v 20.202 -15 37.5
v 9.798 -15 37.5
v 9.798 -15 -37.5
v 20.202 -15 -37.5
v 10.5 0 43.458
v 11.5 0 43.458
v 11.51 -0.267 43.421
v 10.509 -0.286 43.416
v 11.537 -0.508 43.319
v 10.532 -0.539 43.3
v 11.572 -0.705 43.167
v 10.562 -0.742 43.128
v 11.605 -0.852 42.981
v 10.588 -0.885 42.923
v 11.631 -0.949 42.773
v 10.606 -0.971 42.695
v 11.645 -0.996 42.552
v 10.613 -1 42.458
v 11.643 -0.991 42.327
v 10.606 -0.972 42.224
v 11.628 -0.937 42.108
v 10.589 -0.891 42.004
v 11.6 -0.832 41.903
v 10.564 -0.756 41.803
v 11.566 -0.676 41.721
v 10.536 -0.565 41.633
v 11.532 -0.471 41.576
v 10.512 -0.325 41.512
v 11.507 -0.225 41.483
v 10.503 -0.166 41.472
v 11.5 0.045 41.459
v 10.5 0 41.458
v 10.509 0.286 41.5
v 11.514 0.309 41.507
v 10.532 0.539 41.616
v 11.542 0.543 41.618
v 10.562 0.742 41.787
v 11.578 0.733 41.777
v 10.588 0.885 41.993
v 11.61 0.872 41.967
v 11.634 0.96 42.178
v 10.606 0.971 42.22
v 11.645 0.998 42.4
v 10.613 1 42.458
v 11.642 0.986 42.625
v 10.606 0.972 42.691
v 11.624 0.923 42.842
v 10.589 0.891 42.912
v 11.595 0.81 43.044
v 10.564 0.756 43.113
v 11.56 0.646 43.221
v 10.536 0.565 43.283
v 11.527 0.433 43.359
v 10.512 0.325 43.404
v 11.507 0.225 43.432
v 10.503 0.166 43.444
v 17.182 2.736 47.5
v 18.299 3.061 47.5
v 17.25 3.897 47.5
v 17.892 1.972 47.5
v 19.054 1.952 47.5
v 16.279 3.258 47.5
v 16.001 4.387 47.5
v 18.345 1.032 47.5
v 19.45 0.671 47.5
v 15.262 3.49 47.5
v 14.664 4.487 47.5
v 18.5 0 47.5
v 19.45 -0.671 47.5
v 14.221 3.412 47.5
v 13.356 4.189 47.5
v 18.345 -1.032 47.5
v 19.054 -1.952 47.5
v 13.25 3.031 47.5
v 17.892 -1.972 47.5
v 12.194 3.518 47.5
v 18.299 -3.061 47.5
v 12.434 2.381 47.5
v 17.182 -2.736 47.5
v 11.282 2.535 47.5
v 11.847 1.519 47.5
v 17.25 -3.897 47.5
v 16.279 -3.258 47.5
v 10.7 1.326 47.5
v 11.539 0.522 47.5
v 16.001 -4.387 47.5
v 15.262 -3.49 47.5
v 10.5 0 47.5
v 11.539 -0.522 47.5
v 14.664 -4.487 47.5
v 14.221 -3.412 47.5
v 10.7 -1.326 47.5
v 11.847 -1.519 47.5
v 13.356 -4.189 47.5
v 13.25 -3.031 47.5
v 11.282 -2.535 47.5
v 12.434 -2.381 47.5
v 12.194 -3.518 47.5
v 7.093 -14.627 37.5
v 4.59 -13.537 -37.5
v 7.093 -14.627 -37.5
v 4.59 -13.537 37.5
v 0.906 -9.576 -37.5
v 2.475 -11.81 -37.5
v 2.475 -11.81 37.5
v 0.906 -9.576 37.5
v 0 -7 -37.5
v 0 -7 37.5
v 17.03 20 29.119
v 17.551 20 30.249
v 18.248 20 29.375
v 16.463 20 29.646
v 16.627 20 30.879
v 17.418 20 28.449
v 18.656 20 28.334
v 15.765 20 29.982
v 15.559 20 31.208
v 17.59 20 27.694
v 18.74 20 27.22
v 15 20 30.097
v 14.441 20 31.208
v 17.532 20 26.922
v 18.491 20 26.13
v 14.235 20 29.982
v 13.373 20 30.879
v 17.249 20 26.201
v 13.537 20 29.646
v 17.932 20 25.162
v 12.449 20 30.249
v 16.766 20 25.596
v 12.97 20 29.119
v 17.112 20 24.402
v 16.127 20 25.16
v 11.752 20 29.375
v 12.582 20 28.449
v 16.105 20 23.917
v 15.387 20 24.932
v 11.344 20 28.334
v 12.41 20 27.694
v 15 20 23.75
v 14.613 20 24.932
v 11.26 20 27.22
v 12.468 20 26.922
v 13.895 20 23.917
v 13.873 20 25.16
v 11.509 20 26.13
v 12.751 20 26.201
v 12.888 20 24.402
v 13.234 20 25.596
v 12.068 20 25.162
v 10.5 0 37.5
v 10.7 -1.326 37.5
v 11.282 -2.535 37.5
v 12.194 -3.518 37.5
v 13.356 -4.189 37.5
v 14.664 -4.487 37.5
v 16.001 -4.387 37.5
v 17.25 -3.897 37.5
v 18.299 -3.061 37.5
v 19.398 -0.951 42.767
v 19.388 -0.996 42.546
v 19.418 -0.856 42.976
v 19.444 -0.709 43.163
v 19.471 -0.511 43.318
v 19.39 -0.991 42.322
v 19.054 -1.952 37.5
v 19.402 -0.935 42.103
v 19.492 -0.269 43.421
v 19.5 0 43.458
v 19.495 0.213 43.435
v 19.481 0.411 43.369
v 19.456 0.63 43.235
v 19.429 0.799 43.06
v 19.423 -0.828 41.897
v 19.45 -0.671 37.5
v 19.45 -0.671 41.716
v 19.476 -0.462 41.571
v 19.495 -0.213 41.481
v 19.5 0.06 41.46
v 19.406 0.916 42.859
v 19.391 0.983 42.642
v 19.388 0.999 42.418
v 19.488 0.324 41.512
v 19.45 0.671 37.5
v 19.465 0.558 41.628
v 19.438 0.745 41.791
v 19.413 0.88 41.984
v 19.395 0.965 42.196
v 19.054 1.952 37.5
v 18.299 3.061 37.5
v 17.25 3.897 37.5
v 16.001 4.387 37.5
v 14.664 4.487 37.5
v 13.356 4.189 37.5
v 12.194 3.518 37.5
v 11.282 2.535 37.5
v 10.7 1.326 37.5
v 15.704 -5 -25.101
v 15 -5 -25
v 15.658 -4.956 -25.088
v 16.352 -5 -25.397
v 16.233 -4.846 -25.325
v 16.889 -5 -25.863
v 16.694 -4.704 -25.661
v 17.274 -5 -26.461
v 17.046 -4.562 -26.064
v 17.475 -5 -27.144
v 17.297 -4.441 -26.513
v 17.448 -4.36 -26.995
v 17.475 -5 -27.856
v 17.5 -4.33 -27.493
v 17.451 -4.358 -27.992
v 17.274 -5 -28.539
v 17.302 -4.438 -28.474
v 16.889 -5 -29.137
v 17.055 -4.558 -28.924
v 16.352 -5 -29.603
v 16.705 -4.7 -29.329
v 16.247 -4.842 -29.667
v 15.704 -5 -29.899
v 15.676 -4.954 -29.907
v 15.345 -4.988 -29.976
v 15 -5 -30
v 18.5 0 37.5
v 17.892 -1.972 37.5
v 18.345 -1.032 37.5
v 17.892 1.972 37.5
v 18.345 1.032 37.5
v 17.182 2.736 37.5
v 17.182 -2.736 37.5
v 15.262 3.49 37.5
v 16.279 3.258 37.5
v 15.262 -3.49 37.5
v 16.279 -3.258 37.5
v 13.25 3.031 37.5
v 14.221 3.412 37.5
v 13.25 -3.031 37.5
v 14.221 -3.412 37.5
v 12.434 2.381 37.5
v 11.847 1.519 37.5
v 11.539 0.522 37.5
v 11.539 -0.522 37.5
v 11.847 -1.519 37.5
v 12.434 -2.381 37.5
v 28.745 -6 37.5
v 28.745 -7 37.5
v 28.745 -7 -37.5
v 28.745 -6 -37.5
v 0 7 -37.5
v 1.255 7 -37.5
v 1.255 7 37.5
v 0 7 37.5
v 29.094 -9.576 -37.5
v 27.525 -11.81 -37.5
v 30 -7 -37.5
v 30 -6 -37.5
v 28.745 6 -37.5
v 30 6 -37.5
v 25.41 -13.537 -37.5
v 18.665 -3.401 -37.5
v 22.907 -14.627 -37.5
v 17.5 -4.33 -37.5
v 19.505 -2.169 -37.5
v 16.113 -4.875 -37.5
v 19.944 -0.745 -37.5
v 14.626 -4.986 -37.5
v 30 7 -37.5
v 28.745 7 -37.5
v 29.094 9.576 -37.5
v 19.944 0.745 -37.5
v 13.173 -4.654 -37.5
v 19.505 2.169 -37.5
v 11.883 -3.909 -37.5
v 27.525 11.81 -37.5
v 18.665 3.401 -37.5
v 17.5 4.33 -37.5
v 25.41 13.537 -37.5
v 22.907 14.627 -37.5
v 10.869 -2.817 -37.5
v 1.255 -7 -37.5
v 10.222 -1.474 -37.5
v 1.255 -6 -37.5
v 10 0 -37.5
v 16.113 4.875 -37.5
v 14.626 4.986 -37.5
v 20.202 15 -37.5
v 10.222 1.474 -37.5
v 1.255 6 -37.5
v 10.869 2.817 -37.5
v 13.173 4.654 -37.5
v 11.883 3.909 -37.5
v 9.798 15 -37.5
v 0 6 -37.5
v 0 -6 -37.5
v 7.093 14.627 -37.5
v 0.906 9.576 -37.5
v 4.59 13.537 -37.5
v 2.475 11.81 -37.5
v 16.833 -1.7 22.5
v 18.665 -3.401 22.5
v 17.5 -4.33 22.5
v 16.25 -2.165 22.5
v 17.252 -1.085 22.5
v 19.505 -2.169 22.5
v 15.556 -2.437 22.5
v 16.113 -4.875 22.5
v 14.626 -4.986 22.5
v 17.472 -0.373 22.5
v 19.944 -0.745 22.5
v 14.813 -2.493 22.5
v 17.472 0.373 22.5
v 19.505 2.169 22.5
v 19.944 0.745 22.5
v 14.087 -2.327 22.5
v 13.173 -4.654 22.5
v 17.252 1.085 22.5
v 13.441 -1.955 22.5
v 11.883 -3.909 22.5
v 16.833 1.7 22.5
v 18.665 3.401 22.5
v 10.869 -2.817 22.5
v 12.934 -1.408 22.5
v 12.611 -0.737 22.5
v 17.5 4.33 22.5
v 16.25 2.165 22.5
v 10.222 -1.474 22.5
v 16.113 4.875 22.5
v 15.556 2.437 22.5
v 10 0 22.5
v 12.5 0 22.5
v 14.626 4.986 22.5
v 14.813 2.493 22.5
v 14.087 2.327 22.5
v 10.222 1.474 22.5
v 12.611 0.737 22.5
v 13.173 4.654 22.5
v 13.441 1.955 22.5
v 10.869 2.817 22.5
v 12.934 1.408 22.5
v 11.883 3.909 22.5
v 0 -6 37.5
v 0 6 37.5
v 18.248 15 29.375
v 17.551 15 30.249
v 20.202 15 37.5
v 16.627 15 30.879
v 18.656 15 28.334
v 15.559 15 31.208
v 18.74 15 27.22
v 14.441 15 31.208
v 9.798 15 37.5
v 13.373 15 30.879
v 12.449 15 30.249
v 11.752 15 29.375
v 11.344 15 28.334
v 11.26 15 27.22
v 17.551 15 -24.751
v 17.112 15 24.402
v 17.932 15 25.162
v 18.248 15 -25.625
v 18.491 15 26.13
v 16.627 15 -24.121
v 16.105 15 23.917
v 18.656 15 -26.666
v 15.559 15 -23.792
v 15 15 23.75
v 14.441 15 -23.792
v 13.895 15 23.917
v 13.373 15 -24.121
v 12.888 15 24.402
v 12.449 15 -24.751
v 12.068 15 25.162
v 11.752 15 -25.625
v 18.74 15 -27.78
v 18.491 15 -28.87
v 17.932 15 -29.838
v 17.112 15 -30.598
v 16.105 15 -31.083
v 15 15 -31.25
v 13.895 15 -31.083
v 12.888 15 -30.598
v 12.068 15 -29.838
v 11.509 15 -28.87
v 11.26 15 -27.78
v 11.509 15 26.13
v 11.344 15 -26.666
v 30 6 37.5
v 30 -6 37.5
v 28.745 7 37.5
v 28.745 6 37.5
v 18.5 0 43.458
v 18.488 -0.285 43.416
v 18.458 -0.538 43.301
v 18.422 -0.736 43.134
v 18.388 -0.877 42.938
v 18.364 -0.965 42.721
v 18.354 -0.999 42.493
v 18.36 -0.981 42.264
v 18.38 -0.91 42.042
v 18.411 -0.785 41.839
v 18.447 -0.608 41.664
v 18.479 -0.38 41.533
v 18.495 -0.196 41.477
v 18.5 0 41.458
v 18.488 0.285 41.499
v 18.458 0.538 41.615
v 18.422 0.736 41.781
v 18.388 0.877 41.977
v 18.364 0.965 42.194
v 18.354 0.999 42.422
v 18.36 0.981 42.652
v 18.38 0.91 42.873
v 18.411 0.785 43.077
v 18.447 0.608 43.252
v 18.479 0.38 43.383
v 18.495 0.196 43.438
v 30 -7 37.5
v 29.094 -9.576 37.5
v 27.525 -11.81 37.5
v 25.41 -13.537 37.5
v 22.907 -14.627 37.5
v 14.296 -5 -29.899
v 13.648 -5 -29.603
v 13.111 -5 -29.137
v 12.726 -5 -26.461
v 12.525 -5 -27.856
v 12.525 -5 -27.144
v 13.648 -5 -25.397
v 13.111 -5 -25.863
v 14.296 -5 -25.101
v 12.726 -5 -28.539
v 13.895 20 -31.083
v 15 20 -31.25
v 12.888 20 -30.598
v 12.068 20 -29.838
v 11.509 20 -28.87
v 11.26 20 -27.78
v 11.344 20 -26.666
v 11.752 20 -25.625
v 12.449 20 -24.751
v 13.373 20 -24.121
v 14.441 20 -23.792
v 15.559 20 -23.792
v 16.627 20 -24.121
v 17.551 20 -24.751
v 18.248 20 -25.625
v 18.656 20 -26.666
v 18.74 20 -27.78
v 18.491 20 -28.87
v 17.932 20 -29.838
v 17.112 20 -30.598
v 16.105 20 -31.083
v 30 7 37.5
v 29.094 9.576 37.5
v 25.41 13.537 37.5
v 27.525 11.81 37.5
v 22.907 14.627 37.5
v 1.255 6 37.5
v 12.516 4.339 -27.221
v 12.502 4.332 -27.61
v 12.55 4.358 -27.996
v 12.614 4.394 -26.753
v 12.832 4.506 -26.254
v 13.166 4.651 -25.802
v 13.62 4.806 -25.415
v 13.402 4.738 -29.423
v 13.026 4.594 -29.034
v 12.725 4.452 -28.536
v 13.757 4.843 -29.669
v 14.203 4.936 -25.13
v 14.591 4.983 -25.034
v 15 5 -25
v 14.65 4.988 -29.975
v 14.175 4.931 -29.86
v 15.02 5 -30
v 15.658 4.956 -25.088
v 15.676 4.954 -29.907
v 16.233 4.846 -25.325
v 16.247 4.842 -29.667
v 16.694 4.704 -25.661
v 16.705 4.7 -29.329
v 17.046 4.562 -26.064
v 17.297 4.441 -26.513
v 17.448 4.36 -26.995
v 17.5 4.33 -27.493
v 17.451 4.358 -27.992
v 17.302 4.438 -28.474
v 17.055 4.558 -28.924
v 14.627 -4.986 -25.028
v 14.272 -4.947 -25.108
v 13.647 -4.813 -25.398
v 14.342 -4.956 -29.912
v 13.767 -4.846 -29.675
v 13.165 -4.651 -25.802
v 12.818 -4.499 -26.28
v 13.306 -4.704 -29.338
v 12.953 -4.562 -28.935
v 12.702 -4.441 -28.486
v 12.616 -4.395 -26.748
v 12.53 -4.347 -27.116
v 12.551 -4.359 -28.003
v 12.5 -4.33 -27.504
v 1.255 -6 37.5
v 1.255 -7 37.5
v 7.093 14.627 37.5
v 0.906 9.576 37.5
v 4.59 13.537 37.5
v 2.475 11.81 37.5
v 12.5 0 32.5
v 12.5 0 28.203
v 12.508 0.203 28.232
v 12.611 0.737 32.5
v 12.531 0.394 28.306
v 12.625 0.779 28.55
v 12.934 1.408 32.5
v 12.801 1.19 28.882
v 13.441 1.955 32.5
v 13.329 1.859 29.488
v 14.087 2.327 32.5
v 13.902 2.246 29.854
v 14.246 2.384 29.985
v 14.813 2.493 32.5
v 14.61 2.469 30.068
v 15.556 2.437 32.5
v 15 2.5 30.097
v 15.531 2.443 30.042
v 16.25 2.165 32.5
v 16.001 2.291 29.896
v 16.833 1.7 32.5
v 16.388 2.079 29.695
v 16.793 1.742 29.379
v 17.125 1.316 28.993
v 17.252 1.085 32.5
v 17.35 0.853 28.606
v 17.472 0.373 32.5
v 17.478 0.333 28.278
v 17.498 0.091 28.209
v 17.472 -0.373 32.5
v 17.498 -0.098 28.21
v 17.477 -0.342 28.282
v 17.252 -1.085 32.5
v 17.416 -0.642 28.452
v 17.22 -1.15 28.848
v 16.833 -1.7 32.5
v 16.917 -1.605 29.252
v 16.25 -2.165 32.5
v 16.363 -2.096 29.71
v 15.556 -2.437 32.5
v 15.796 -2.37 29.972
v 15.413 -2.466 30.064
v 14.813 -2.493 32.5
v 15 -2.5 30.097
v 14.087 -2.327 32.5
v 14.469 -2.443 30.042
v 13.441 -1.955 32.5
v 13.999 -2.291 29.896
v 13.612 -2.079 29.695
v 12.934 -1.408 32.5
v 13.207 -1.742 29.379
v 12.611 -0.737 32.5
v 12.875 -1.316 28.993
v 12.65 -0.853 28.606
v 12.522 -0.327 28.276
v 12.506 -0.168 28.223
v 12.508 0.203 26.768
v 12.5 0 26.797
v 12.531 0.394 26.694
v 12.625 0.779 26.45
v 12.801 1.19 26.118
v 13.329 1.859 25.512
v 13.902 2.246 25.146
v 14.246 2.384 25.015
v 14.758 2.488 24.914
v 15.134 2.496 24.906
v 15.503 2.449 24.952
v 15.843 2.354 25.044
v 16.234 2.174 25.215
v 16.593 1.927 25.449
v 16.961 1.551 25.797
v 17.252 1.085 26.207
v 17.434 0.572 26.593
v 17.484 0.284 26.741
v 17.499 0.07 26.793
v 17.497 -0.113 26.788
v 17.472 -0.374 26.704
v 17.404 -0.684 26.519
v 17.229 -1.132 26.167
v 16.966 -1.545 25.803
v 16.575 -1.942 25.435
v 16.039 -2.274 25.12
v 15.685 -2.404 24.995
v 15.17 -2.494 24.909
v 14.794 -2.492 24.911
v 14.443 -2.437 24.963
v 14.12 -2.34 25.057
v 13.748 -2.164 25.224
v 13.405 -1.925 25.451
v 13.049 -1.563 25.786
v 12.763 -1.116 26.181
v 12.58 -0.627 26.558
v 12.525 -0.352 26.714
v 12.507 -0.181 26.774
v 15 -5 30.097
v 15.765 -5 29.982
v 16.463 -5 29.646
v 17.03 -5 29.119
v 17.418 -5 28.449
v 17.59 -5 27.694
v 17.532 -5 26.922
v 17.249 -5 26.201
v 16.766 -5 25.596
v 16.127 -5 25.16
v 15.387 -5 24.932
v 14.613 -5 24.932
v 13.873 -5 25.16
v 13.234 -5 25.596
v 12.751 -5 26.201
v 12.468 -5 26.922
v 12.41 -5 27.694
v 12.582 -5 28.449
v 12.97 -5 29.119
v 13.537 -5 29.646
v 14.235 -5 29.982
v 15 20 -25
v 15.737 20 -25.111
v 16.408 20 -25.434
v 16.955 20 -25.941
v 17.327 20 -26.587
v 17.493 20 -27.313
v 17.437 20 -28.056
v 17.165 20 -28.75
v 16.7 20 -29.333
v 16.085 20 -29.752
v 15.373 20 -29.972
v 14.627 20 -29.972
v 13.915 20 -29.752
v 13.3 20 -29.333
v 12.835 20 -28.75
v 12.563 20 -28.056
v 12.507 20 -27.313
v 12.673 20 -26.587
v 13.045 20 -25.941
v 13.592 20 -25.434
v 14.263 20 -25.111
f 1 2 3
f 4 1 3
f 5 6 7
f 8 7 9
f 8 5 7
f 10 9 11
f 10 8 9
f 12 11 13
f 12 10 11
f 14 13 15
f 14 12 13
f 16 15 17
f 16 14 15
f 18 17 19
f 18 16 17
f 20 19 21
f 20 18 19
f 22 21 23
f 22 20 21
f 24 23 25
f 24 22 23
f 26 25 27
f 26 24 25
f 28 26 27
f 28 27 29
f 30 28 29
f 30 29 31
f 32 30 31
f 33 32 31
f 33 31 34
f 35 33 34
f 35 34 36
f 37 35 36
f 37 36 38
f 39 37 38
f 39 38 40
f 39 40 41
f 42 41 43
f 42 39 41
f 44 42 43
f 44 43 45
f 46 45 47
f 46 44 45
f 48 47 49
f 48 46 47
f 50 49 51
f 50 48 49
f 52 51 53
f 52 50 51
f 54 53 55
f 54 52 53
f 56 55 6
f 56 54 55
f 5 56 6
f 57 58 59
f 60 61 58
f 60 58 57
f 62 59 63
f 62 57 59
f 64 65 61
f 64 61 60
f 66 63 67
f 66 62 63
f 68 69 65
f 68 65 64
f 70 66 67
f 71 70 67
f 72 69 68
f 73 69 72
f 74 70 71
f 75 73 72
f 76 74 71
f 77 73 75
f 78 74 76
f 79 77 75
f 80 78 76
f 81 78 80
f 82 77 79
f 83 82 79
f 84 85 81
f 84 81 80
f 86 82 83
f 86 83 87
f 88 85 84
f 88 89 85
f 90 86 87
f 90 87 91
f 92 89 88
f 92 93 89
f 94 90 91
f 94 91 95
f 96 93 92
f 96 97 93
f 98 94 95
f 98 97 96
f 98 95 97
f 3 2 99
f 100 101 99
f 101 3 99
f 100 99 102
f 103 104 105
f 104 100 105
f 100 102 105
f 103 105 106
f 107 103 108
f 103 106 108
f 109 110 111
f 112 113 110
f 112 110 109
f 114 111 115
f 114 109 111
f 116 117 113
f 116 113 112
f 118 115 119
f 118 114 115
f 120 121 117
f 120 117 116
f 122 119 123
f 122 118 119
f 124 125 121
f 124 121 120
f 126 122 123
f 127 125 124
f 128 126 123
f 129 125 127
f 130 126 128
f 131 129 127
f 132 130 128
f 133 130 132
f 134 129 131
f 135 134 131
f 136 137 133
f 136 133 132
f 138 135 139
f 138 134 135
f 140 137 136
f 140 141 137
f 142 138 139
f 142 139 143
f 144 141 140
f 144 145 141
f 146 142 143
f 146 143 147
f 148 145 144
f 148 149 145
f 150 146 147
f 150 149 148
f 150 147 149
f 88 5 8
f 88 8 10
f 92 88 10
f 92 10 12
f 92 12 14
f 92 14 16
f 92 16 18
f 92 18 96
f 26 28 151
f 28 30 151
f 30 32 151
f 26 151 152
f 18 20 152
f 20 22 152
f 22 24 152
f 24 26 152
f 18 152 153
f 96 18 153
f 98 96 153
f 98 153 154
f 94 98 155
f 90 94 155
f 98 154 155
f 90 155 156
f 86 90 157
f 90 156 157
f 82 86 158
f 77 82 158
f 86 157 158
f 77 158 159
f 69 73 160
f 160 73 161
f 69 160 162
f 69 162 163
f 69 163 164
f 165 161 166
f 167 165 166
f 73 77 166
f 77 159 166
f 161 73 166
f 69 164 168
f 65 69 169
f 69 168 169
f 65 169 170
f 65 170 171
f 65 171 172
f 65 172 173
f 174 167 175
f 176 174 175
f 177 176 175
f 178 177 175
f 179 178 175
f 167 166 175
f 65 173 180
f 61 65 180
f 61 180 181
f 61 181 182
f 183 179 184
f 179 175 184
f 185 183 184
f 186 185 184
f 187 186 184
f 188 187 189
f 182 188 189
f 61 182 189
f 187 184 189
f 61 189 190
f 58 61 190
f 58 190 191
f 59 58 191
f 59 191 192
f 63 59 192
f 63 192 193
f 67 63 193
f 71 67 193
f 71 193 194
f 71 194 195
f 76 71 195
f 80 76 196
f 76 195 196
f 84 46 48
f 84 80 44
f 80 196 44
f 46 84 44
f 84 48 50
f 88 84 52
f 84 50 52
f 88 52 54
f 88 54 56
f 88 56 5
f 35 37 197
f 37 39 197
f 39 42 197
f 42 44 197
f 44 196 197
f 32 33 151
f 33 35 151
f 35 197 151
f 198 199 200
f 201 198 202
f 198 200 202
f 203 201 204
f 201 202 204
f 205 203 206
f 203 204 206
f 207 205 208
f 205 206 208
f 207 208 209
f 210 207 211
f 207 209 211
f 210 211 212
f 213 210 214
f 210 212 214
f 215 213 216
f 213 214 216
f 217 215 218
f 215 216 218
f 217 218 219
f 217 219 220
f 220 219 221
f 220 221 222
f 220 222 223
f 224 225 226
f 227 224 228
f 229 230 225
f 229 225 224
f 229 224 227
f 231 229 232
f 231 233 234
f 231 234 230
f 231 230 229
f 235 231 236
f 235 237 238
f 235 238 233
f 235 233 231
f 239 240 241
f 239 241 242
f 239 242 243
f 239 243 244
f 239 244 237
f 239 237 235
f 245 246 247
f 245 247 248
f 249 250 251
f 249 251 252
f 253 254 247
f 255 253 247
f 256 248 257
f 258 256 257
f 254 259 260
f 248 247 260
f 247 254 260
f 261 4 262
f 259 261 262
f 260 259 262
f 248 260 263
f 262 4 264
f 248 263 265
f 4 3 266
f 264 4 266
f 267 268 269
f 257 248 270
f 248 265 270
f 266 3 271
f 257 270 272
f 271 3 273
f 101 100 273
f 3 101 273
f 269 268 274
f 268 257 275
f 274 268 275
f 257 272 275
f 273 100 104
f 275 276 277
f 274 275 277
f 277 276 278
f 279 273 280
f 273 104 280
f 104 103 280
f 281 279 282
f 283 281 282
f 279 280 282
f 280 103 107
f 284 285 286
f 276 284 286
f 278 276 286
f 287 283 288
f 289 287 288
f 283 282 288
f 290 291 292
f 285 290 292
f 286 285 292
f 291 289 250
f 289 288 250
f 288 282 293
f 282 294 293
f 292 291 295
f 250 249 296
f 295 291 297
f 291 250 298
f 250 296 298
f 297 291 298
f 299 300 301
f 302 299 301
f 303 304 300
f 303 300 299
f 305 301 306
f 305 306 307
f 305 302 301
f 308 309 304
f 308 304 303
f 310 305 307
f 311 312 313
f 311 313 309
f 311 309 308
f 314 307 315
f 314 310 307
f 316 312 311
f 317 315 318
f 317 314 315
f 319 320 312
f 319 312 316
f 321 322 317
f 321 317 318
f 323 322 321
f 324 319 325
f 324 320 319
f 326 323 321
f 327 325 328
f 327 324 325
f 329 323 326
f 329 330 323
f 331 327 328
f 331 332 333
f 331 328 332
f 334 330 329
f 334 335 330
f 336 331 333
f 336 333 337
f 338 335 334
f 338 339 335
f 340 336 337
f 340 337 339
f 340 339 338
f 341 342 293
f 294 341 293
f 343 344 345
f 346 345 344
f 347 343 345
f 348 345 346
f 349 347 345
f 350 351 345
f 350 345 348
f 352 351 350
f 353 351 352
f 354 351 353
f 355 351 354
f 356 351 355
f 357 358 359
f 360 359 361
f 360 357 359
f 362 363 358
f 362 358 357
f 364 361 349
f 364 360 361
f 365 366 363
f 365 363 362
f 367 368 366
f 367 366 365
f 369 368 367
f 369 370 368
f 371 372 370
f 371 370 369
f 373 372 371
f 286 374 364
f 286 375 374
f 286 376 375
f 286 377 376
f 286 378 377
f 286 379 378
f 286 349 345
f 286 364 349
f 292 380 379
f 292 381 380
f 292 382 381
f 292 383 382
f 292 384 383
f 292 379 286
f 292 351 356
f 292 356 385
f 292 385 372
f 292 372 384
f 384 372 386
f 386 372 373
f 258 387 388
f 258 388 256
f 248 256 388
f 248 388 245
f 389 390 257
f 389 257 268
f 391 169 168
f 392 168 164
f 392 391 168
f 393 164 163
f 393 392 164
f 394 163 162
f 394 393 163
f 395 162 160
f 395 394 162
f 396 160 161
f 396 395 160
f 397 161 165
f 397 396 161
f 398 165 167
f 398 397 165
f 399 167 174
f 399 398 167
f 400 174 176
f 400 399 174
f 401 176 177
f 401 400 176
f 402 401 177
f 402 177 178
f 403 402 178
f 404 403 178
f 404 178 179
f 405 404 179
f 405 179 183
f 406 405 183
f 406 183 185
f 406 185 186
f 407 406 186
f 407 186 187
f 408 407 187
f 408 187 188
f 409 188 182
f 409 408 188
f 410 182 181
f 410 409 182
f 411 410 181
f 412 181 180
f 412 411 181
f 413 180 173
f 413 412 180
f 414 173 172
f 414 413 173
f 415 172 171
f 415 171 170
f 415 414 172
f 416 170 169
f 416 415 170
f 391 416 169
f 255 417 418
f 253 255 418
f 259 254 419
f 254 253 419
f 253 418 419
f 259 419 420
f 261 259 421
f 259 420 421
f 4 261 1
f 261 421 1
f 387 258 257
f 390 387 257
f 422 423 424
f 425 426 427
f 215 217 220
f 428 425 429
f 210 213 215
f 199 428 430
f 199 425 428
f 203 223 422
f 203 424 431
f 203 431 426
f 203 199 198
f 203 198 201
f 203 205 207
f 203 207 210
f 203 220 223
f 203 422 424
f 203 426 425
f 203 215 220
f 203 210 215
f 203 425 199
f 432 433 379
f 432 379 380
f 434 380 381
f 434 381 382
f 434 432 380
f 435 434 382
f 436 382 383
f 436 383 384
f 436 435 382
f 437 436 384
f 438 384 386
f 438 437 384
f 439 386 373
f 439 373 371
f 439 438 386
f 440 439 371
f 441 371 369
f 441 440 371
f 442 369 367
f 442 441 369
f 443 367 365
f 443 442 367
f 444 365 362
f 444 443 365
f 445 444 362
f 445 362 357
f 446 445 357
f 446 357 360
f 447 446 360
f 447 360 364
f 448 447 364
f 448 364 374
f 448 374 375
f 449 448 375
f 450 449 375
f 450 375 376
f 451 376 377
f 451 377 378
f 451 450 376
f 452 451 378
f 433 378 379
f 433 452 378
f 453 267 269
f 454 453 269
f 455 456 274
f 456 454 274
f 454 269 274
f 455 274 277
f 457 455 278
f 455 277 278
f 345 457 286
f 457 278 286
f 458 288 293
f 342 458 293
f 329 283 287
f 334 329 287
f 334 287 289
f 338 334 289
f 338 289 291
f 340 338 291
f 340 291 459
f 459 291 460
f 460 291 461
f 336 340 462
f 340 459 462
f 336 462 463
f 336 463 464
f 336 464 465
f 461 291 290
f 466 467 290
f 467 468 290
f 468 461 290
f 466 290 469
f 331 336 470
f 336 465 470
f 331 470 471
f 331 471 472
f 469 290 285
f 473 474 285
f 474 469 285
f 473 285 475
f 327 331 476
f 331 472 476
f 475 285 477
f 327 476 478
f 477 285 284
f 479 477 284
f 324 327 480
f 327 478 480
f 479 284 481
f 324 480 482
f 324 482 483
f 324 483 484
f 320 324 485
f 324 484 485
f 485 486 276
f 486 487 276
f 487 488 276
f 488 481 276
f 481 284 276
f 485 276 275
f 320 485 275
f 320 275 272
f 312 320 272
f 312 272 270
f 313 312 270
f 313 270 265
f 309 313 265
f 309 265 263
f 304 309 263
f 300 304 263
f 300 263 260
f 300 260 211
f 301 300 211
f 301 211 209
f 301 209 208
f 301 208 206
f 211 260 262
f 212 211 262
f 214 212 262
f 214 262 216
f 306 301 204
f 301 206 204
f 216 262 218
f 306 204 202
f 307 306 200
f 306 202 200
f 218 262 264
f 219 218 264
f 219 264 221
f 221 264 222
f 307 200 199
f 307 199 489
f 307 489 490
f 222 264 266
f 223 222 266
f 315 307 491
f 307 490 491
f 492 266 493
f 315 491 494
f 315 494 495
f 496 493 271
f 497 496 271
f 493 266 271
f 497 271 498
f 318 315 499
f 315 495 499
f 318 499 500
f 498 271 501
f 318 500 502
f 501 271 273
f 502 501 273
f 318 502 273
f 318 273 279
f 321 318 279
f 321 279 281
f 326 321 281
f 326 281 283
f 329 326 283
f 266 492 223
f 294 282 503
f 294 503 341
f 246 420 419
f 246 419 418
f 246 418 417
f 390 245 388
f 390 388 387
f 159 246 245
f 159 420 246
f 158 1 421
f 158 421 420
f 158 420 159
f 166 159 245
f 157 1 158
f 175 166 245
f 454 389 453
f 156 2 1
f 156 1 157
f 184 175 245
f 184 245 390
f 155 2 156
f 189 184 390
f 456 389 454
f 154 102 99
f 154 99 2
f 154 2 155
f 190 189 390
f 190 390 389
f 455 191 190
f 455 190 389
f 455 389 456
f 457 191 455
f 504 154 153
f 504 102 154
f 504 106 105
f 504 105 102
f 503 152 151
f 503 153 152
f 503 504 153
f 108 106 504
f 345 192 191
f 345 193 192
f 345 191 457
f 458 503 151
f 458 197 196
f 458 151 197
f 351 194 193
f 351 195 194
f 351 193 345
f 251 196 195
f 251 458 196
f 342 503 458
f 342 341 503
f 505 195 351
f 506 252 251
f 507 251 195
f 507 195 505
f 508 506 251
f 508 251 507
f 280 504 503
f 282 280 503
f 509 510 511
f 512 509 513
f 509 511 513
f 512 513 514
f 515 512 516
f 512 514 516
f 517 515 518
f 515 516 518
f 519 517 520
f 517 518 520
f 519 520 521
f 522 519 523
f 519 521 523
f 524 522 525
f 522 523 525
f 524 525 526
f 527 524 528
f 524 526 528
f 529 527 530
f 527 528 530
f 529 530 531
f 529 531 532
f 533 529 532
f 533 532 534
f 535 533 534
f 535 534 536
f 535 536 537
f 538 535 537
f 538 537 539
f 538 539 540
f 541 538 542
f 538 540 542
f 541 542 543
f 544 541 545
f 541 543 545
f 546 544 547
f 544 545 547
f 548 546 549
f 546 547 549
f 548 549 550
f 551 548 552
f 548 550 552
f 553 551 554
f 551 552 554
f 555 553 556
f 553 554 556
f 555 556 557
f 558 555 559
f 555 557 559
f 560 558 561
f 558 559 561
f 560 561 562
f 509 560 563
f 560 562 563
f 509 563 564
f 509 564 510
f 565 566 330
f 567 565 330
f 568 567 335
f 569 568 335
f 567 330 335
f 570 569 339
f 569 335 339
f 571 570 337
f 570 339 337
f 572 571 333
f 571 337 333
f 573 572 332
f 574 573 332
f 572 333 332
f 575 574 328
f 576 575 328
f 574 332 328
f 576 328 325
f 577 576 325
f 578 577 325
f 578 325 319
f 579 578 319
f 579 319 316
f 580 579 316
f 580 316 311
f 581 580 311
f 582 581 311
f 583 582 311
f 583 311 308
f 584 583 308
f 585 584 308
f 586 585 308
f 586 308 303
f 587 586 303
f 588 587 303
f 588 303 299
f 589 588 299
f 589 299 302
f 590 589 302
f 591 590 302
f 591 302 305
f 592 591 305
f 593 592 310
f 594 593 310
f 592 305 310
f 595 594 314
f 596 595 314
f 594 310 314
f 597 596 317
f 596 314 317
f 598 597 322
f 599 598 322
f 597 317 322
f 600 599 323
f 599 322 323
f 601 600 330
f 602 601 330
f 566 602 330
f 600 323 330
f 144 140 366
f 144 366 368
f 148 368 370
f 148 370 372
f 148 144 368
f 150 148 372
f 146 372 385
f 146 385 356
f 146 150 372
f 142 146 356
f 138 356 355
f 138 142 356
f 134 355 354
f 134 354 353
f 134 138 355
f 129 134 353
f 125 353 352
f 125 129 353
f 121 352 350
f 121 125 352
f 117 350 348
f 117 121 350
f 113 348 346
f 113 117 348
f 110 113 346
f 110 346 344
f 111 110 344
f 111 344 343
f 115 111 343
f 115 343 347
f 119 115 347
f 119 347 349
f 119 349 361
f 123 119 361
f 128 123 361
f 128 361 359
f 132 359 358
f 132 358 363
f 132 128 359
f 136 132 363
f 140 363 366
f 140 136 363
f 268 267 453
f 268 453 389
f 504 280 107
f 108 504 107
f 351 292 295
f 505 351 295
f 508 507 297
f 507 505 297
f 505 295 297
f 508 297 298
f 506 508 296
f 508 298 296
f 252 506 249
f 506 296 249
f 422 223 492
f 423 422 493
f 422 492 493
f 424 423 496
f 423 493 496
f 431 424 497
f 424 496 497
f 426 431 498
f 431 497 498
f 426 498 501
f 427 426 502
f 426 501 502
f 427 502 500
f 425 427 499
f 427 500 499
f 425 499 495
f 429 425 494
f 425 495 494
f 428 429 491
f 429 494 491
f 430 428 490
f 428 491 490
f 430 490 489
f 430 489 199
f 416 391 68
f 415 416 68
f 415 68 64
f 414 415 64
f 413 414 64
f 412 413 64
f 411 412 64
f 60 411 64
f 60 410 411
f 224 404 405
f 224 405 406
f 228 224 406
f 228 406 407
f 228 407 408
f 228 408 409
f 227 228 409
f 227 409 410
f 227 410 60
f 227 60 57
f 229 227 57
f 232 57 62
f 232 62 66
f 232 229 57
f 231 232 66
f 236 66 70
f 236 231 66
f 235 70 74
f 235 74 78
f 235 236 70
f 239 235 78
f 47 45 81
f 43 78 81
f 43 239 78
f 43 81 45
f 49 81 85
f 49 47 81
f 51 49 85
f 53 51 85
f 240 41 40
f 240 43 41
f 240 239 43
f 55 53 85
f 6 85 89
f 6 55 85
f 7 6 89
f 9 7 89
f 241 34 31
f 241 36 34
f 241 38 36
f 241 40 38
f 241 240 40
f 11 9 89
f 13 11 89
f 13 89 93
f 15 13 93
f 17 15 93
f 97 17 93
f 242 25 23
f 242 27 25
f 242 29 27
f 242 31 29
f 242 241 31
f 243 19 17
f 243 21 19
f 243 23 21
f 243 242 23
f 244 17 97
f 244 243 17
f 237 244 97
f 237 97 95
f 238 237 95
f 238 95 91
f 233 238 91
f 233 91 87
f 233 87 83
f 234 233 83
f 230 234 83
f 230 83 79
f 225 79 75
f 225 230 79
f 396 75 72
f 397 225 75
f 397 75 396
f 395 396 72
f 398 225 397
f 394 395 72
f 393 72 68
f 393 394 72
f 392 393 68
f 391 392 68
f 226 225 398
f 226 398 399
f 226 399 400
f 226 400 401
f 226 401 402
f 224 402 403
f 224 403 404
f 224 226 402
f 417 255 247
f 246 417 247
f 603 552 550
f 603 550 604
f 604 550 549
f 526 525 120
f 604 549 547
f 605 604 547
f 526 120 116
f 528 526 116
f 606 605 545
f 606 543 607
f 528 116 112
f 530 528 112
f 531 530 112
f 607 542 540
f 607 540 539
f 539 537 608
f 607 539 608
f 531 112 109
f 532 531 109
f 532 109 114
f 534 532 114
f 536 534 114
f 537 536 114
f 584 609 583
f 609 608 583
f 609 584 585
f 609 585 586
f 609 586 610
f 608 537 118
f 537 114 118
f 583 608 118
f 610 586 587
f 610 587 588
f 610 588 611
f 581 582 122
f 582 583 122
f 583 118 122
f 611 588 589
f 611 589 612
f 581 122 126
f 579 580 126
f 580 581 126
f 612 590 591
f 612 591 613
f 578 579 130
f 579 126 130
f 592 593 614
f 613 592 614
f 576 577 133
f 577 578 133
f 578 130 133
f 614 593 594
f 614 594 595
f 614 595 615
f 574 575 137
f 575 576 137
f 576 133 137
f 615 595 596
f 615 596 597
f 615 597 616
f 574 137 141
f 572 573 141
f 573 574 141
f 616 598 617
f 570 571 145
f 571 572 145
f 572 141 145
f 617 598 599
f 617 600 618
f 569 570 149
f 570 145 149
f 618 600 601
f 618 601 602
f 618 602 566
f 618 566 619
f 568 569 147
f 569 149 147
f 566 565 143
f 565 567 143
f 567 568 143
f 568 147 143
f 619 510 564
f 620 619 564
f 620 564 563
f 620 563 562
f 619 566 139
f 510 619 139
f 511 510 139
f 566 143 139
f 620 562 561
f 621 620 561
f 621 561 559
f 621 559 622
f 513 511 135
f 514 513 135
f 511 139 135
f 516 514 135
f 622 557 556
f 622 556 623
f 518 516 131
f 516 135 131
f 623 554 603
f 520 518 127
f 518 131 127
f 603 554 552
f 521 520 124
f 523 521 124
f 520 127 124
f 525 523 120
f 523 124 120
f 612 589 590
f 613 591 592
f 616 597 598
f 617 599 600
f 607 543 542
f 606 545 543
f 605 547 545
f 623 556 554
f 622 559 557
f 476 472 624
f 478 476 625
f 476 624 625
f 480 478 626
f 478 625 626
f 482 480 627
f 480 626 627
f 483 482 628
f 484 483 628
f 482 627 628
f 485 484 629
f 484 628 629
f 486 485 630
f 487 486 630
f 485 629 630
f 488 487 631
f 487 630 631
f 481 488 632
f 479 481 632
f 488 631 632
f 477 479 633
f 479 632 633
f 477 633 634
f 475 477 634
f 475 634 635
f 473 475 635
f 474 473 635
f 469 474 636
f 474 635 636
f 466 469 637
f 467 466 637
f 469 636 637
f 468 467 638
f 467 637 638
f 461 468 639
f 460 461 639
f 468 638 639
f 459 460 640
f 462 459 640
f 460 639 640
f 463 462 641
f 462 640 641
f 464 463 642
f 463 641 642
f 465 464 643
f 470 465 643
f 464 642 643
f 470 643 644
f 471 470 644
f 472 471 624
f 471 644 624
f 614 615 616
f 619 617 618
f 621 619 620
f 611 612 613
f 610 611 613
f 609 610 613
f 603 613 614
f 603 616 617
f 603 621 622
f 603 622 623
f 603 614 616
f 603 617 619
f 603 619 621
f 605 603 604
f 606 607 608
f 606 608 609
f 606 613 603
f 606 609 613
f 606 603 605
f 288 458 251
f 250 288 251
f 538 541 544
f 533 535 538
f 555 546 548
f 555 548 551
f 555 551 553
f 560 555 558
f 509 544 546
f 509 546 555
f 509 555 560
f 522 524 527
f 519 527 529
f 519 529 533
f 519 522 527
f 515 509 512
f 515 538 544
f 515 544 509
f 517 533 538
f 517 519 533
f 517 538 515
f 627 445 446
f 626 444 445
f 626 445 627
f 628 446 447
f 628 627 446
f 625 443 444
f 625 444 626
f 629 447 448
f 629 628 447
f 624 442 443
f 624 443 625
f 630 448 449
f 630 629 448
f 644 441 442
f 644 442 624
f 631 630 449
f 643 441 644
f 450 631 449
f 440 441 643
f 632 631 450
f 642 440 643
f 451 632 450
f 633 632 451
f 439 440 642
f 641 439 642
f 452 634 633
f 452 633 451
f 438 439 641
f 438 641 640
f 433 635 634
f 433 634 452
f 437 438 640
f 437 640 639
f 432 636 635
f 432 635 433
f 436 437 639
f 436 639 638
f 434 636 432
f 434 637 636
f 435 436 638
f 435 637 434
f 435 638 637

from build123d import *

# Parameters (mm, degrees)
SKETCH1_W           = 75
SKETCH1_H           = 30
BOSS_EXTRUDE1_DEPTH = 30
SKETCH3_R           = 5
CUT_EXTRUDE1_DEPTH  = 60
SKETCH4_W           = 1.254965376
SKETCH4_H           = 1
CUT_EXTRUDE2_DEPTH  = 83.158383626
SKETCH5_R           = 2.5
SKETCH5_R_2         = 2.597055459
CUT_EXTRUDE3_DEPTH  = 20
BOSS_EXTRUDE2_START = 5
SKETCH6_R           = 3.75
SKETCH6_R_2         = 2.597055459
SKETCH6_R_3         = 2.5
BOSS_EXTRUDE2_DEPTH = 5
SKETCH7_R           = 2.5
CUT_EXTRUDE4_DEPTH  = 10
SKETCH8_R           = 4.5
SKETCH8_R_2         = 3.5
BOSS_EXTRUDE3_DEPTH = 10
SKETCH9_R           = 1
CUT_EXTRUDE5_DEPTH  = 60.634302243
FILLET1_R           = 10


with BuildPart() as part:
    # Sketch1 → Boss-Extrude1 (new body)
    with BuildSketch(Plane(origin=(0, 0, 0), x_dir=(0, 0, -1), z_dir=(1, 0, 0))):
        Rectangle(SKETCH1_W, SKETCH1_H)
    extrude(amount=BOSS_EXTRUDE1_DEPTH)

    # Sketch3 → Cut-Extrude1 (cut)
    with BuildSketch(Plane(origin=(0, 0, -37.5), x_dir=(-1, 0, 0), z_dir=(0, 0, -1))):
        with Locations((-15, 0)):
            Circle(SKETCH3_R)
    extrude(amount=-CUT_EXTRUDE1_DEPTH, mode=Mode.SUBTRACT)

    # Sketch4 → Cut-Extrude2 (cut, through all)
    with BuildSketch(Plane(origin=(0, 0, -37.5), x_dir=(-1, 0, 0), z_dir=(0, 0, -1))):
        with Locations((-29.372517312, 6.5)):
            Rectangle(SKETCH4_W, SKETCH4_H)
        with Locations((-29.372517312, -6.5)):
            Rectangle(SKETCH4_W, SKETCH4_H)
        with Locations((-0.627482688, -6.5)):
            Rectangle(SKETCH4_W, SKETCH4_H)
        with Locations((-0.627482688, 6.5)):
            Rectangle(SKETCH4_W, SKETCH4_H)
    extrude(amount=-CUT_EXTRUDE2_DEPTH, mode=Mode.SUBTRACT)

    # Sketch5 → Cut-Extrude3 (cut)
    with BuildSketch(Plane(origin=(0, 15, 0), x_dir=(1, 0, 0), z_dir=(0, 1, 0))):
        with Locations(Location((15, 27.5, 0), (0, 0, 270))):
            Circle(SKETCH5_R)
        with Locations(Location((15, -27.5, 0), (0, 0, 270))):
            Circle(SKETCH5_R_2)
    extrude(amount=-CUT_EXTRUDE3_DEPTH, mode=Mode.SUBTRACT)

    # Sketch6 → Boss-Extrude2 (add)
    # profile 1 of 2: a face of its own
    with BuildSketch(Plane(origin=(0, 15, 0), x_dir=(1, 0, 0), z_dir=(0, 1, 0)).offset(BOSS_EXTRUDE2_START)):
        with Locations(Location((15, -27.5, 0), (0, 0, 90))):
            Circle(SKETCH6_R)
        with Locations(Location((15, -27.5, 0), (0, 0, 270))):
            Circle(SKETCH6_R_2, mode=Mode.SUBTRACT)
    # profile 2 of 2: a face of its own
    with BuildSketch(Plane(origin=(0, 15, 0), x_dir=(1, 0, 0), z_dir=(0, 1, 0)).offset(BOSS_EXTRUDE2_START)):
        with Locations(Location((15, 27.5, 0), (0, 0, 90))):
            Circle(SKETCH6_R)
        with Locations(Location((15, 27.5, 0), (0, 0, 270))):
            Circle(SKETCH6_R_3, mode=Mode.SUBTRACT)
    extrude(amount=-BOSS_EXTRUDE2_DEPTH)

    # Sketch7 → Cut-Extrude4 (cut)
    with BuildSketch(Plane(origin=(0, 0, 22.5), x_dir=(-1, 0, 0), z_dir=(0, 0, -1))):
        with Locations((-15, 0)):
            Circle(SKETCH7_R)
    extrude(amount=-CUT_EXTRUDE4_DEPTH, mode=Mode.SUBTRACT)

    # Sketch8 → Boss-Extrude3 (add)
    with BuildSketch(Plane.XY.offset(37.5)):
        with Locations(Location((15, 0, 0), (0, 0, 180))):
            Circle(SKETCH8_R)
        with Locations((15, 0)):
            Circle(SKETCH8_R_2, mode=Mode.SUBTRACT)
    extrude(amount=BOSS_EXTRUDE3_DEPTH)

    # Sketch9 → Cut-Extrude5 (cut, through all)
    with BuildSketch(Plane(origin=(0, 0, 0), x_dir=(0, 0, -1), z_dir=(1, 0, 0))):
        with Locations(Location((-42.457775401, 0, 0), (0, 0, 180))):
            Circle(SKETCH9_R)
    extrude(amount=CUT_EXTRUDE5_DEPTH, mode=Mode.SUBTRACT)

    # Fillet1
    # the kernel refuses this fillet: 10 mm, written as the material it takes off along each edge
    with BuildSketch(Plane(origin=(30, -15, 61.994897428), x_dir=(-1, 0, 0), z_dir=(0, 0, -1)), Plane(origin=(30, 15, -61.994897428), x_dir=(-1, 0, 0), z_dir=(0, 0, 1))) as fillet1_piece_1:
        with BuildLine():
            CenterArc((9.797958971, 10), FILLET1_R, 191.536959033, 78.463040967)
            Line((0, 8), (-0.195959179, 7.96))
            ThreePointArc((-0.195959179, 7.96), (-0.2, 4), (-0.2, 0))
            Line((-0.2, 0), (0, -0.2))
            Line((0, -0.2), (9.797958971, -0.2))
            Line((9.797958971, -0.2), (9.797958971, 0))
        make_face()
    extrude(amount=123.989794856, mode=Mode.SUBTRACT)
    with BuildSketch(Plane(origin=(0, -15, 61.994897428), x_dir=(1, 0, 0), z_dir=(0, 0, -1))) as fillet1_piece_2:
        with BuildLine():
            CenterArc((9.797958971, -10), FILLET1_R, 90, 78.463040967)
            Line((0, -8), (-0.195959179, -7.96))
            ThreePointArc((-0.195959179, -7.96), (-0.2, -4), (-0.2, 0))
            Line((-0.2, 0), (0, 0.2))
            Line((0, 0.2), (9.797958971, 0.2))
            Line((9.797958971, 0.2), (9.797958971, 0))
        make_face()
    extrude(amount=123.989794856, mode=Mode.SUBTRACT)
    with BuildSketch(Plane(origin=(0, 15, -61.994897428), x_dir=(0, -1, 0), z_dir=(0, 0, 1))) as fillet1_piece_3:
        with BuildLine():
            CenterArc((10, 9.797958971), FILLET1_R, 180, 78.463040967)
            Line((0, 9.797958971), (-0.2, 9.797958971))
            Line((-0.2, 9.797958971), (-0.2, 0))
            Line((-0.2, 0), (0, -0.2))
            ThreePointArc((0, -0.2), (4, -0.2), (7.96, -0.195959179))
            Line((7.96, -0.195959179), (8, 0))
        make_face()
    extrude(amount=123.989794856, mode=Mode.SUBTRACT)


solid = part.part
